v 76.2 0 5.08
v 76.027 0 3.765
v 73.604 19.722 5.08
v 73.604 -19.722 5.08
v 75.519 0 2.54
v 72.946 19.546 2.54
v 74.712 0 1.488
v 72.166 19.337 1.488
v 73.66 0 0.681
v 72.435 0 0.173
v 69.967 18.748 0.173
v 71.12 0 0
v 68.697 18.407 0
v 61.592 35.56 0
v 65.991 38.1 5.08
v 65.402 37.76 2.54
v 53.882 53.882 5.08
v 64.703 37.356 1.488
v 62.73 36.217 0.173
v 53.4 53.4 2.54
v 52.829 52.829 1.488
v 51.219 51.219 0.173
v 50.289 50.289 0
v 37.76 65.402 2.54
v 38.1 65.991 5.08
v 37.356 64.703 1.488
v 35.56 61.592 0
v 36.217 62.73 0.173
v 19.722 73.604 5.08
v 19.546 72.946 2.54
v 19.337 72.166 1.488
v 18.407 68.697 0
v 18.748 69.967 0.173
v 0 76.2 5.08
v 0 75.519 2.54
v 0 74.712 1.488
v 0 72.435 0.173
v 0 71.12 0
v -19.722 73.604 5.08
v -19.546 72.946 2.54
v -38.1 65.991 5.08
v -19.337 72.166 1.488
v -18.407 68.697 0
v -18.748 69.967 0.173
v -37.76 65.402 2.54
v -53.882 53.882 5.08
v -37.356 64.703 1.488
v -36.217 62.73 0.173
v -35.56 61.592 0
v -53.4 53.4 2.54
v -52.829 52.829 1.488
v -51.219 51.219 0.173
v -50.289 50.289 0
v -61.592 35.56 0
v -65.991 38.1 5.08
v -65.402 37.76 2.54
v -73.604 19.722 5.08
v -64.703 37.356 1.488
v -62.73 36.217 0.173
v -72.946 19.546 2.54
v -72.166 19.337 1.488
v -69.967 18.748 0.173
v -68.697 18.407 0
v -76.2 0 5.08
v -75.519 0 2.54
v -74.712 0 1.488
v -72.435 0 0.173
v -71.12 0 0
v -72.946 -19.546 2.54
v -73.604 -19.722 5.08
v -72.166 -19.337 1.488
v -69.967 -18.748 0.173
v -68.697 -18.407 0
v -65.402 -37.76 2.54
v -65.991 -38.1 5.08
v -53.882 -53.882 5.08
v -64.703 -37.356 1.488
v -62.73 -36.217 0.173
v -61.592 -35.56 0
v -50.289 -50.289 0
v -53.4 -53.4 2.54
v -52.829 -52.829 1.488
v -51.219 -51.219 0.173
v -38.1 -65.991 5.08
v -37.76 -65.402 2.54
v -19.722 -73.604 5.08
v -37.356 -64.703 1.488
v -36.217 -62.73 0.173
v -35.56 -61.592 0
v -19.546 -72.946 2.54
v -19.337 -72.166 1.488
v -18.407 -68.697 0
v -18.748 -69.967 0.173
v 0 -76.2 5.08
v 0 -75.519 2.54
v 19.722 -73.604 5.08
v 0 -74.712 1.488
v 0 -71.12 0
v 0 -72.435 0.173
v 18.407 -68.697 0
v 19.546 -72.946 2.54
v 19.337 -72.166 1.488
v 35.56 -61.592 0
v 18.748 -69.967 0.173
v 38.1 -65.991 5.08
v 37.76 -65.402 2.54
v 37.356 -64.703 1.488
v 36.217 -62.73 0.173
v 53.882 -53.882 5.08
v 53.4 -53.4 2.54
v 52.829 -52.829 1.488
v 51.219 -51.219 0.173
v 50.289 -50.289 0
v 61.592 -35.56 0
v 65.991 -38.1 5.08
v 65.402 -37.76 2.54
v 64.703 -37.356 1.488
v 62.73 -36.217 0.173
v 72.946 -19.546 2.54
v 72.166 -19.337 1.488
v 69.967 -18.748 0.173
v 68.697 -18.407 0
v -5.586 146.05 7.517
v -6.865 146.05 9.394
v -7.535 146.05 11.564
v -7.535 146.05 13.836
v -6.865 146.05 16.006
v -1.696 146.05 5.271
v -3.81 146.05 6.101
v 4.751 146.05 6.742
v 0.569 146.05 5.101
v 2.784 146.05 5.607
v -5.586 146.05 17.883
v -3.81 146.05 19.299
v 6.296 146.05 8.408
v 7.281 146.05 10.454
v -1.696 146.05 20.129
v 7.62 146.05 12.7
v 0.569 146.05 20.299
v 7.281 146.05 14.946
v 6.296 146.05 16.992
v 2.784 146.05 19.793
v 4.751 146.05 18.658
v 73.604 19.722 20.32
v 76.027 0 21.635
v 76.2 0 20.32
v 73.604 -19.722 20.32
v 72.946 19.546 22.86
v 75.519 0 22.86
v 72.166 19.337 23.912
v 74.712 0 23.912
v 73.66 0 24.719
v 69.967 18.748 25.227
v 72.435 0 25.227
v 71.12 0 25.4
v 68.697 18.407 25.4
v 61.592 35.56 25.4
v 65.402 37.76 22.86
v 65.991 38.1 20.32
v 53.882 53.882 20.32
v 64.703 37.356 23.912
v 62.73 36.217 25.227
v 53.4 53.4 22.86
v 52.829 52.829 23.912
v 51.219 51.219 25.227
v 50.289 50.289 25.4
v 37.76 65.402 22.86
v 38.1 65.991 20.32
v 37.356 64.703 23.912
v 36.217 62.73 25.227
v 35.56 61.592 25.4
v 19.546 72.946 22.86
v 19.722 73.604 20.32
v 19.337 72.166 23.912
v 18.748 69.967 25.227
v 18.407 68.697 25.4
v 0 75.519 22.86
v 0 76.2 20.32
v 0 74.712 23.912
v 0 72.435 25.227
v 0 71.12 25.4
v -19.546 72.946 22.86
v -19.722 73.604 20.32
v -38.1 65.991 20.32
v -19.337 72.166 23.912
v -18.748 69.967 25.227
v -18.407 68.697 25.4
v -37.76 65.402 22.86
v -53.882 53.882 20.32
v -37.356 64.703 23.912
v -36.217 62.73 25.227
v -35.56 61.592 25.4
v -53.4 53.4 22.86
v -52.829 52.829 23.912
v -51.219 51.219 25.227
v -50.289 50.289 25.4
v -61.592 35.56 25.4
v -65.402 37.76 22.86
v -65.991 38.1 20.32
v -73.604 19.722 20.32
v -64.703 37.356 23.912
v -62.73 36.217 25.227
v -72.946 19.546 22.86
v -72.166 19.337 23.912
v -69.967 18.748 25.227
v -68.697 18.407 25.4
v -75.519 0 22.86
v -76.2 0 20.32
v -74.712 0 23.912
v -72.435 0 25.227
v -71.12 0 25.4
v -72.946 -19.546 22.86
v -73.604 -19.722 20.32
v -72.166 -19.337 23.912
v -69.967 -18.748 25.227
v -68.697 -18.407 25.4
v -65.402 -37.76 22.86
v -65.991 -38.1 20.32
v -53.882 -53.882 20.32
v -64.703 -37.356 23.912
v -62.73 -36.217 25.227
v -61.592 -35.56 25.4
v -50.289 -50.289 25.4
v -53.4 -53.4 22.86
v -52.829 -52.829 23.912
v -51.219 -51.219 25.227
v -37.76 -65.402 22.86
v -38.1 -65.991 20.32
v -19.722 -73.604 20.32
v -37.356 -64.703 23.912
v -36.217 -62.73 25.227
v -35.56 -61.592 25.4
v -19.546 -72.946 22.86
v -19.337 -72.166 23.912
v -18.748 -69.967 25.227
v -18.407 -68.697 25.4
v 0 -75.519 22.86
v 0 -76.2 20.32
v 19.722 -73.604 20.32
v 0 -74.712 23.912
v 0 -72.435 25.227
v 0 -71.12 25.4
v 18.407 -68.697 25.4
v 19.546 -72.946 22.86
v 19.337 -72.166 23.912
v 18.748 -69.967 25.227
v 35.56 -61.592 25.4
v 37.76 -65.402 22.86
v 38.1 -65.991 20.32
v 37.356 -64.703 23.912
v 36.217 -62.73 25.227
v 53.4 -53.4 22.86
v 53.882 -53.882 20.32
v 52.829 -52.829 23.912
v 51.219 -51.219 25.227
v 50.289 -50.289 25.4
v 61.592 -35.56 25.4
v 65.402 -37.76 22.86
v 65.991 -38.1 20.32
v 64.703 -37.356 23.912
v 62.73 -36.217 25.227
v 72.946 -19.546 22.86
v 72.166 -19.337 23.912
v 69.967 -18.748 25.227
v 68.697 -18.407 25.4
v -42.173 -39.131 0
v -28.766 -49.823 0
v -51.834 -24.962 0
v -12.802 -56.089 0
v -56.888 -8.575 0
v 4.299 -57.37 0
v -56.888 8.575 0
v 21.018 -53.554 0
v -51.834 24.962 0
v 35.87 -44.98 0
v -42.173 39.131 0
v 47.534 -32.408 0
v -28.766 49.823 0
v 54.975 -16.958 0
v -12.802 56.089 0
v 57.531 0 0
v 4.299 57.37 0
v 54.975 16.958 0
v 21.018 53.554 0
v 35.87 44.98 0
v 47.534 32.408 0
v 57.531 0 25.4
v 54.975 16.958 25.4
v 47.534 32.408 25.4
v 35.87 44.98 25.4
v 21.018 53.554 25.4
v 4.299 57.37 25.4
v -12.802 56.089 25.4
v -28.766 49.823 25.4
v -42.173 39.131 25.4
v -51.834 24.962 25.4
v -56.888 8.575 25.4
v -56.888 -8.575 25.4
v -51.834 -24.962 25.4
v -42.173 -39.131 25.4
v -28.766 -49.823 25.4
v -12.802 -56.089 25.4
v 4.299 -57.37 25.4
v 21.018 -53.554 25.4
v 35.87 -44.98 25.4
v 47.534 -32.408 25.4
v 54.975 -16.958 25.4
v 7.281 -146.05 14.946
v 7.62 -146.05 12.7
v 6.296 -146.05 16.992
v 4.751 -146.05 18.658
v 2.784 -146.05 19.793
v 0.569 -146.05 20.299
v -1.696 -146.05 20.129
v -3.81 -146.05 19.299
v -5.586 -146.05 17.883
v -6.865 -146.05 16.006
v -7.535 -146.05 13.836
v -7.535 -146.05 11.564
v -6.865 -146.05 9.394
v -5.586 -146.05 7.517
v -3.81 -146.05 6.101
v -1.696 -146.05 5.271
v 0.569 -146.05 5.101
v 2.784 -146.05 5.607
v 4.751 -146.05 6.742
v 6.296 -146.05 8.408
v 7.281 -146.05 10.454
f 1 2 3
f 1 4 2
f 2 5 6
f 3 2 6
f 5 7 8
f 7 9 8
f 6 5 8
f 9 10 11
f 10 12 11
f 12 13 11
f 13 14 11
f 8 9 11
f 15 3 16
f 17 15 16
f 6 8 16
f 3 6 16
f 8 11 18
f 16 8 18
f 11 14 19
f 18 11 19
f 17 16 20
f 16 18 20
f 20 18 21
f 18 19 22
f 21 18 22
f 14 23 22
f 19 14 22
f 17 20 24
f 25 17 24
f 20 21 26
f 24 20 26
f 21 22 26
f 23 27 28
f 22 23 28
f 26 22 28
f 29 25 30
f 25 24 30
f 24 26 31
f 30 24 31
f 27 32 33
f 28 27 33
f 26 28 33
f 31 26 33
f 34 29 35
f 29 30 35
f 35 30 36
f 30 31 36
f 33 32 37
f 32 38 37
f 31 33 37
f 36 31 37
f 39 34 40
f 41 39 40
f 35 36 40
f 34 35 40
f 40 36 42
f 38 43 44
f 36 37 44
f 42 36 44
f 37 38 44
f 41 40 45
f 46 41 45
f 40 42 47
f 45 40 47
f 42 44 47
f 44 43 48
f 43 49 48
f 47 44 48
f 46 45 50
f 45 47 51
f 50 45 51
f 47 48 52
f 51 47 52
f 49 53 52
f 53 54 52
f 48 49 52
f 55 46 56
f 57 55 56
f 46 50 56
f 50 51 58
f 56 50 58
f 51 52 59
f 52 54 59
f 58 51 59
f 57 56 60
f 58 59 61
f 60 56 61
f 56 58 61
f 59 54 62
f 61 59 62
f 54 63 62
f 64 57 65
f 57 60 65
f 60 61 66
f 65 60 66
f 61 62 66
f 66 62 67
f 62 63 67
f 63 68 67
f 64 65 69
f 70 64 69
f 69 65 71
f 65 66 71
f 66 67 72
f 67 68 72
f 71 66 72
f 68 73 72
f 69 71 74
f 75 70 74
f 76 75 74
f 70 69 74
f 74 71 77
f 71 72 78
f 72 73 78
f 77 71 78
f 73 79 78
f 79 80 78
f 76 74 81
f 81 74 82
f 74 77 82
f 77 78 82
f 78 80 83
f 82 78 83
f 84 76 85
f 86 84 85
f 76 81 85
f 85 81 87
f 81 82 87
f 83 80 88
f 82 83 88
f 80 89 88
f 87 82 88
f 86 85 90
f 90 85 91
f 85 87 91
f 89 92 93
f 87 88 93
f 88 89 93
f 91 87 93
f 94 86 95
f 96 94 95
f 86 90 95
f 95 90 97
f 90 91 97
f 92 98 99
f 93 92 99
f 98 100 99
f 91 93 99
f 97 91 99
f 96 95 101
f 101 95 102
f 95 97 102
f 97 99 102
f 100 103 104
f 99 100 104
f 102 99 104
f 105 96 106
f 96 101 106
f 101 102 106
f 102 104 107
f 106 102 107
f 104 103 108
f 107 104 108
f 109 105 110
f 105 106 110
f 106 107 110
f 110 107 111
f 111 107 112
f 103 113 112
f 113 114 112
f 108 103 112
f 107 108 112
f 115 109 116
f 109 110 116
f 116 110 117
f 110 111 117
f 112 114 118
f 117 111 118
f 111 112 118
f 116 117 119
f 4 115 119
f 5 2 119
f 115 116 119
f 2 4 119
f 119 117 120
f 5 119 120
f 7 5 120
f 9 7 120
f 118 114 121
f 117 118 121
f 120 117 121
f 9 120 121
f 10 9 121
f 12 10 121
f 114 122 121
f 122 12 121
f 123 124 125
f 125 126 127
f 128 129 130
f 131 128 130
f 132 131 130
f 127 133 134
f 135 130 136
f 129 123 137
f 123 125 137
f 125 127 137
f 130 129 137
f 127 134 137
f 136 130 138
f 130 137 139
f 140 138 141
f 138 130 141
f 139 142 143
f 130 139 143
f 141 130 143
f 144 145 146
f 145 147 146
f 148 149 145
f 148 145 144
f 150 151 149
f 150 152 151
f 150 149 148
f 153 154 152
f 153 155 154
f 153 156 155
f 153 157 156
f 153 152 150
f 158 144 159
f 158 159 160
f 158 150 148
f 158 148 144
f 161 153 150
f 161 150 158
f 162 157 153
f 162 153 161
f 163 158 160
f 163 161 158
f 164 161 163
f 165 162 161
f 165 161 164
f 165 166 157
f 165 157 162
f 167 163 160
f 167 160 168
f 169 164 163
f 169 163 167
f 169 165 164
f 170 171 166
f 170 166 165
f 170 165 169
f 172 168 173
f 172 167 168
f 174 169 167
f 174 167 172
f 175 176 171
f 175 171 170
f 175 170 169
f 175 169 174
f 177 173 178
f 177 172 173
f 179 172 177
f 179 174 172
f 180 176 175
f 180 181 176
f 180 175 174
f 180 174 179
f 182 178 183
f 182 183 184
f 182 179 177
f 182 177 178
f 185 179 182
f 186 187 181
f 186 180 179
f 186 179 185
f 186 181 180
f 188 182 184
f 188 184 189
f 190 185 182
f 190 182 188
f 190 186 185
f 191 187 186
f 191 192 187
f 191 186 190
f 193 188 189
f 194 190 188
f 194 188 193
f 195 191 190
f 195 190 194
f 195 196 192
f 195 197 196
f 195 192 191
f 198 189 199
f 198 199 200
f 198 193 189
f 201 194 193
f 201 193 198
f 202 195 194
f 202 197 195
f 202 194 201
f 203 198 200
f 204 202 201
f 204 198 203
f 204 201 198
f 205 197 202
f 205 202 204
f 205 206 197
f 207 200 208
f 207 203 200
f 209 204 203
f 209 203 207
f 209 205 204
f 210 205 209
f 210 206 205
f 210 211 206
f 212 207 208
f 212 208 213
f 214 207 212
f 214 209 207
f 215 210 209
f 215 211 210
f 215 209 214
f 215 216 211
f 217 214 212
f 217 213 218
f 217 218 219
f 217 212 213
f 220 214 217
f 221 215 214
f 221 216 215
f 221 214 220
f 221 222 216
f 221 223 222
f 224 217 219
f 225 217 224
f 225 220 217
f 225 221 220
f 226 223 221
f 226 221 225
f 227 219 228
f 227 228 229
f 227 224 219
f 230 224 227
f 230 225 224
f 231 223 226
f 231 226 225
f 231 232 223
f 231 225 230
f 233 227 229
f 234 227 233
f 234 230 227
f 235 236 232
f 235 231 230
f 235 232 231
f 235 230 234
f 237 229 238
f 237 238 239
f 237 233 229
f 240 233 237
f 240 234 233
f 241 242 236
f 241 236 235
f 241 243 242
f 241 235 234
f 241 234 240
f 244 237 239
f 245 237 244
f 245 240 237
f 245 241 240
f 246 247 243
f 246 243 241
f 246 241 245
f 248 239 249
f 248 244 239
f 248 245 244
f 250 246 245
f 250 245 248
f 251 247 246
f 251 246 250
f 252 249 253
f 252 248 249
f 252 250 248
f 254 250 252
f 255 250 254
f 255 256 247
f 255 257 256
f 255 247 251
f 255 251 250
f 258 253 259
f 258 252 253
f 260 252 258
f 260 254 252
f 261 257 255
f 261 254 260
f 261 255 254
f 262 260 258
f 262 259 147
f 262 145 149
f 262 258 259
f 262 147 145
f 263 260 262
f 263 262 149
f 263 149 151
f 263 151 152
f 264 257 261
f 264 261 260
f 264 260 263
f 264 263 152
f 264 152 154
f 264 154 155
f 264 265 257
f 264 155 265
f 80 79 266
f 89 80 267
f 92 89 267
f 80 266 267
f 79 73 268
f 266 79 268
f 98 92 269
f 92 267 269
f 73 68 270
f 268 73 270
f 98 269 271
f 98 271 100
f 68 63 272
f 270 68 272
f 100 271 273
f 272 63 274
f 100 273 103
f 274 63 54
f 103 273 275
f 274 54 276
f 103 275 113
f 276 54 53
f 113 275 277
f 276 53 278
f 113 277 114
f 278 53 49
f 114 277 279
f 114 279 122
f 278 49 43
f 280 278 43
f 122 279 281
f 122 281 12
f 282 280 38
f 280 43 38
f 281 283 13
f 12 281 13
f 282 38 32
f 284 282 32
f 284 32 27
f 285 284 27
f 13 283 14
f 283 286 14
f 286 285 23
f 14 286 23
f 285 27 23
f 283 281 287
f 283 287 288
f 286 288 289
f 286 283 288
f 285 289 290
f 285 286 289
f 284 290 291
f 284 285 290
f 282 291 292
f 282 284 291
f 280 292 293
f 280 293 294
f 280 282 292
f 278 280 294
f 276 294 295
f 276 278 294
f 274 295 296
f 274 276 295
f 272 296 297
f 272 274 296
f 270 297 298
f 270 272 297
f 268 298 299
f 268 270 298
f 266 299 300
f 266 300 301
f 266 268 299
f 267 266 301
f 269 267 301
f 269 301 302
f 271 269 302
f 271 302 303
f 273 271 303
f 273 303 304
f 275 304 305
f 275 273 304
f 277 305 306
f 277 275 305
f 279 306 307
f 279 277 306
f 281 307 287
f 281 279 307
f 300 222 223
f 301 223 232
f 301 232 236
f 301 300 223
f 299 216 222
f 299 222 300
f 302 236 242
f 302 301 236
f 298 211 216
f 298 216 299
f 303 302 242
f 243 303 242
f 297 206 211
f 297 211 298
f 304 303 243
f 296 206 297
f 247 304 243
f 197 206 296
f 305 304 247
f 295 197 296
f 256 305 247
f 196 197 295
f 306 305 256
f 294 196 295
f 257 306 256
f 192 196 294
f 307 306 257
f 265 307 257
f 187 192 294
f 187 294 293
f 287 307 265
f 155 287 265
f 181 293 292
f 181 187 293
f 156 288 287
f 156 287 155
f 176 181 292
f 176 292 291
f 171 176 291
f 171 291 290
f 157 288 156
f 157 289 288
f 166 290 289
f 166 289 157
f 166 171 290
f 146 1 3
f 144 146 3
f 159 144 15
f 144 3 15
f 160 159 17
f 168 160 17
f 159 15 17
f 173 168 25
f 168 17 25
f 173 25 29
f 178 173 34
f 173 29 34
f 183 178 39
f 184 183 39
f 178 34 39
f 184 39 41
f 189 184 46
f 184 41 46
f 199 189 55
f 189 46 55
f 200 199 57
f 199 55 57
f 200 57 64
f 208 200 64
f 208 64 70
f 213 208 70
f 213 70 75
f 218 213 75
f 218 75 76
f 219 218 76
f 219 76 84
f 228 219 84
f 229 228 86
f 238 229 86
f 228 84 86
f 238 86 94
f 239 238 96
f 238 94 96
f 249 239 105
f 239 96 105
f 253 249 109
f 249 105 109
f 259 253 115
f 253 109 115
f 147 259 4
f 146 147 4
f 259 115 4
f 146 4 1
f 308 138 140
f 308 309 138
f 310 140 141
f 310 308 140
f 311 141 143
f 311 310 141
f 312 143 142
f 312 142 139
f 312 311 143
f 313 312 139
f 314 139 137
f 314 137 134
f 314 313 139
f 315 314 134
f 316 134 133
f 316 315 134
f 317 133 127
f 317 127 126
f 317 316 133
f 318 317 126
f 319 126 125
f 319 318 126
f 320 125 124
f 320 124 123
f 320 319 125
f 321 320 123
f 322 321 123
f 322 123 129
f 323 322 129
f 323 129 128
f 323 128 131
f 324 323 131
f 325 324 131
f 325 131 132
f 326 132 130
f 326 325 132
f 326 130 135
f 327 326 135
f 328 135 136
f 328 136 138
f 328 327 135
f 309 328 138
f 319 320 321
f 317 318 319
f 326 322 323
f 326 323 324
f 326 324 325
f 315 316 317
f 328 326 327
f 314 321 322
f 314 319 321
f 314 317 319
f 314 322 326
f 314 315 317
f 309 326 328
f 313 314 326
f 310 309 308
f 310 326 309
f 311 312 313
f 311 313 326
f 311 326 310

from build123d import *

# Parameters (mm, degrees)
F0_R     = 76.2
F0_R_2   = 57.531
F1_DEPTH = 25.4
F2_R     = 5.08
F3_R     = 7.62
F4_DEPTH = 146.05
F5_DEPTH = 146.05


with BuildPart() as f1:
    # F0 (on Top) → F1 (new body)
    with BuildSketch(Plane.XY):
        Circle(F0_R)
        Circle(F0_R_2, mode=Mode.SUBTRACT)
    extrude(amount=F1_DEPTH)

    # F2
    f2_edges = [f1.edges().sort_by_distance(p)[0] for p in [
        (-76.2, 0, 25.4),
        (-76.2, 0, 0),
    ]]
    fillet(f2_edges, radius=F2_R)


with BuildPart() as f4:
    # F3 (on Front) → F4 (new body)
    with BuildSketch(Plane.XZ):
        with Locations((0, 12.7)):
            Circle(F3_R)
    extrude(amount=F4_DEPTH)

    # F5 (add): a face of the model
    f5_faces = [f4.faces().sort_by_distance(p)[0] for p in [
        (0, 0, 12.7),
    ]]
    extrude(f5_faces, amount=F5_DEPTH)


solid = Compound([f1.part, f4.part])
